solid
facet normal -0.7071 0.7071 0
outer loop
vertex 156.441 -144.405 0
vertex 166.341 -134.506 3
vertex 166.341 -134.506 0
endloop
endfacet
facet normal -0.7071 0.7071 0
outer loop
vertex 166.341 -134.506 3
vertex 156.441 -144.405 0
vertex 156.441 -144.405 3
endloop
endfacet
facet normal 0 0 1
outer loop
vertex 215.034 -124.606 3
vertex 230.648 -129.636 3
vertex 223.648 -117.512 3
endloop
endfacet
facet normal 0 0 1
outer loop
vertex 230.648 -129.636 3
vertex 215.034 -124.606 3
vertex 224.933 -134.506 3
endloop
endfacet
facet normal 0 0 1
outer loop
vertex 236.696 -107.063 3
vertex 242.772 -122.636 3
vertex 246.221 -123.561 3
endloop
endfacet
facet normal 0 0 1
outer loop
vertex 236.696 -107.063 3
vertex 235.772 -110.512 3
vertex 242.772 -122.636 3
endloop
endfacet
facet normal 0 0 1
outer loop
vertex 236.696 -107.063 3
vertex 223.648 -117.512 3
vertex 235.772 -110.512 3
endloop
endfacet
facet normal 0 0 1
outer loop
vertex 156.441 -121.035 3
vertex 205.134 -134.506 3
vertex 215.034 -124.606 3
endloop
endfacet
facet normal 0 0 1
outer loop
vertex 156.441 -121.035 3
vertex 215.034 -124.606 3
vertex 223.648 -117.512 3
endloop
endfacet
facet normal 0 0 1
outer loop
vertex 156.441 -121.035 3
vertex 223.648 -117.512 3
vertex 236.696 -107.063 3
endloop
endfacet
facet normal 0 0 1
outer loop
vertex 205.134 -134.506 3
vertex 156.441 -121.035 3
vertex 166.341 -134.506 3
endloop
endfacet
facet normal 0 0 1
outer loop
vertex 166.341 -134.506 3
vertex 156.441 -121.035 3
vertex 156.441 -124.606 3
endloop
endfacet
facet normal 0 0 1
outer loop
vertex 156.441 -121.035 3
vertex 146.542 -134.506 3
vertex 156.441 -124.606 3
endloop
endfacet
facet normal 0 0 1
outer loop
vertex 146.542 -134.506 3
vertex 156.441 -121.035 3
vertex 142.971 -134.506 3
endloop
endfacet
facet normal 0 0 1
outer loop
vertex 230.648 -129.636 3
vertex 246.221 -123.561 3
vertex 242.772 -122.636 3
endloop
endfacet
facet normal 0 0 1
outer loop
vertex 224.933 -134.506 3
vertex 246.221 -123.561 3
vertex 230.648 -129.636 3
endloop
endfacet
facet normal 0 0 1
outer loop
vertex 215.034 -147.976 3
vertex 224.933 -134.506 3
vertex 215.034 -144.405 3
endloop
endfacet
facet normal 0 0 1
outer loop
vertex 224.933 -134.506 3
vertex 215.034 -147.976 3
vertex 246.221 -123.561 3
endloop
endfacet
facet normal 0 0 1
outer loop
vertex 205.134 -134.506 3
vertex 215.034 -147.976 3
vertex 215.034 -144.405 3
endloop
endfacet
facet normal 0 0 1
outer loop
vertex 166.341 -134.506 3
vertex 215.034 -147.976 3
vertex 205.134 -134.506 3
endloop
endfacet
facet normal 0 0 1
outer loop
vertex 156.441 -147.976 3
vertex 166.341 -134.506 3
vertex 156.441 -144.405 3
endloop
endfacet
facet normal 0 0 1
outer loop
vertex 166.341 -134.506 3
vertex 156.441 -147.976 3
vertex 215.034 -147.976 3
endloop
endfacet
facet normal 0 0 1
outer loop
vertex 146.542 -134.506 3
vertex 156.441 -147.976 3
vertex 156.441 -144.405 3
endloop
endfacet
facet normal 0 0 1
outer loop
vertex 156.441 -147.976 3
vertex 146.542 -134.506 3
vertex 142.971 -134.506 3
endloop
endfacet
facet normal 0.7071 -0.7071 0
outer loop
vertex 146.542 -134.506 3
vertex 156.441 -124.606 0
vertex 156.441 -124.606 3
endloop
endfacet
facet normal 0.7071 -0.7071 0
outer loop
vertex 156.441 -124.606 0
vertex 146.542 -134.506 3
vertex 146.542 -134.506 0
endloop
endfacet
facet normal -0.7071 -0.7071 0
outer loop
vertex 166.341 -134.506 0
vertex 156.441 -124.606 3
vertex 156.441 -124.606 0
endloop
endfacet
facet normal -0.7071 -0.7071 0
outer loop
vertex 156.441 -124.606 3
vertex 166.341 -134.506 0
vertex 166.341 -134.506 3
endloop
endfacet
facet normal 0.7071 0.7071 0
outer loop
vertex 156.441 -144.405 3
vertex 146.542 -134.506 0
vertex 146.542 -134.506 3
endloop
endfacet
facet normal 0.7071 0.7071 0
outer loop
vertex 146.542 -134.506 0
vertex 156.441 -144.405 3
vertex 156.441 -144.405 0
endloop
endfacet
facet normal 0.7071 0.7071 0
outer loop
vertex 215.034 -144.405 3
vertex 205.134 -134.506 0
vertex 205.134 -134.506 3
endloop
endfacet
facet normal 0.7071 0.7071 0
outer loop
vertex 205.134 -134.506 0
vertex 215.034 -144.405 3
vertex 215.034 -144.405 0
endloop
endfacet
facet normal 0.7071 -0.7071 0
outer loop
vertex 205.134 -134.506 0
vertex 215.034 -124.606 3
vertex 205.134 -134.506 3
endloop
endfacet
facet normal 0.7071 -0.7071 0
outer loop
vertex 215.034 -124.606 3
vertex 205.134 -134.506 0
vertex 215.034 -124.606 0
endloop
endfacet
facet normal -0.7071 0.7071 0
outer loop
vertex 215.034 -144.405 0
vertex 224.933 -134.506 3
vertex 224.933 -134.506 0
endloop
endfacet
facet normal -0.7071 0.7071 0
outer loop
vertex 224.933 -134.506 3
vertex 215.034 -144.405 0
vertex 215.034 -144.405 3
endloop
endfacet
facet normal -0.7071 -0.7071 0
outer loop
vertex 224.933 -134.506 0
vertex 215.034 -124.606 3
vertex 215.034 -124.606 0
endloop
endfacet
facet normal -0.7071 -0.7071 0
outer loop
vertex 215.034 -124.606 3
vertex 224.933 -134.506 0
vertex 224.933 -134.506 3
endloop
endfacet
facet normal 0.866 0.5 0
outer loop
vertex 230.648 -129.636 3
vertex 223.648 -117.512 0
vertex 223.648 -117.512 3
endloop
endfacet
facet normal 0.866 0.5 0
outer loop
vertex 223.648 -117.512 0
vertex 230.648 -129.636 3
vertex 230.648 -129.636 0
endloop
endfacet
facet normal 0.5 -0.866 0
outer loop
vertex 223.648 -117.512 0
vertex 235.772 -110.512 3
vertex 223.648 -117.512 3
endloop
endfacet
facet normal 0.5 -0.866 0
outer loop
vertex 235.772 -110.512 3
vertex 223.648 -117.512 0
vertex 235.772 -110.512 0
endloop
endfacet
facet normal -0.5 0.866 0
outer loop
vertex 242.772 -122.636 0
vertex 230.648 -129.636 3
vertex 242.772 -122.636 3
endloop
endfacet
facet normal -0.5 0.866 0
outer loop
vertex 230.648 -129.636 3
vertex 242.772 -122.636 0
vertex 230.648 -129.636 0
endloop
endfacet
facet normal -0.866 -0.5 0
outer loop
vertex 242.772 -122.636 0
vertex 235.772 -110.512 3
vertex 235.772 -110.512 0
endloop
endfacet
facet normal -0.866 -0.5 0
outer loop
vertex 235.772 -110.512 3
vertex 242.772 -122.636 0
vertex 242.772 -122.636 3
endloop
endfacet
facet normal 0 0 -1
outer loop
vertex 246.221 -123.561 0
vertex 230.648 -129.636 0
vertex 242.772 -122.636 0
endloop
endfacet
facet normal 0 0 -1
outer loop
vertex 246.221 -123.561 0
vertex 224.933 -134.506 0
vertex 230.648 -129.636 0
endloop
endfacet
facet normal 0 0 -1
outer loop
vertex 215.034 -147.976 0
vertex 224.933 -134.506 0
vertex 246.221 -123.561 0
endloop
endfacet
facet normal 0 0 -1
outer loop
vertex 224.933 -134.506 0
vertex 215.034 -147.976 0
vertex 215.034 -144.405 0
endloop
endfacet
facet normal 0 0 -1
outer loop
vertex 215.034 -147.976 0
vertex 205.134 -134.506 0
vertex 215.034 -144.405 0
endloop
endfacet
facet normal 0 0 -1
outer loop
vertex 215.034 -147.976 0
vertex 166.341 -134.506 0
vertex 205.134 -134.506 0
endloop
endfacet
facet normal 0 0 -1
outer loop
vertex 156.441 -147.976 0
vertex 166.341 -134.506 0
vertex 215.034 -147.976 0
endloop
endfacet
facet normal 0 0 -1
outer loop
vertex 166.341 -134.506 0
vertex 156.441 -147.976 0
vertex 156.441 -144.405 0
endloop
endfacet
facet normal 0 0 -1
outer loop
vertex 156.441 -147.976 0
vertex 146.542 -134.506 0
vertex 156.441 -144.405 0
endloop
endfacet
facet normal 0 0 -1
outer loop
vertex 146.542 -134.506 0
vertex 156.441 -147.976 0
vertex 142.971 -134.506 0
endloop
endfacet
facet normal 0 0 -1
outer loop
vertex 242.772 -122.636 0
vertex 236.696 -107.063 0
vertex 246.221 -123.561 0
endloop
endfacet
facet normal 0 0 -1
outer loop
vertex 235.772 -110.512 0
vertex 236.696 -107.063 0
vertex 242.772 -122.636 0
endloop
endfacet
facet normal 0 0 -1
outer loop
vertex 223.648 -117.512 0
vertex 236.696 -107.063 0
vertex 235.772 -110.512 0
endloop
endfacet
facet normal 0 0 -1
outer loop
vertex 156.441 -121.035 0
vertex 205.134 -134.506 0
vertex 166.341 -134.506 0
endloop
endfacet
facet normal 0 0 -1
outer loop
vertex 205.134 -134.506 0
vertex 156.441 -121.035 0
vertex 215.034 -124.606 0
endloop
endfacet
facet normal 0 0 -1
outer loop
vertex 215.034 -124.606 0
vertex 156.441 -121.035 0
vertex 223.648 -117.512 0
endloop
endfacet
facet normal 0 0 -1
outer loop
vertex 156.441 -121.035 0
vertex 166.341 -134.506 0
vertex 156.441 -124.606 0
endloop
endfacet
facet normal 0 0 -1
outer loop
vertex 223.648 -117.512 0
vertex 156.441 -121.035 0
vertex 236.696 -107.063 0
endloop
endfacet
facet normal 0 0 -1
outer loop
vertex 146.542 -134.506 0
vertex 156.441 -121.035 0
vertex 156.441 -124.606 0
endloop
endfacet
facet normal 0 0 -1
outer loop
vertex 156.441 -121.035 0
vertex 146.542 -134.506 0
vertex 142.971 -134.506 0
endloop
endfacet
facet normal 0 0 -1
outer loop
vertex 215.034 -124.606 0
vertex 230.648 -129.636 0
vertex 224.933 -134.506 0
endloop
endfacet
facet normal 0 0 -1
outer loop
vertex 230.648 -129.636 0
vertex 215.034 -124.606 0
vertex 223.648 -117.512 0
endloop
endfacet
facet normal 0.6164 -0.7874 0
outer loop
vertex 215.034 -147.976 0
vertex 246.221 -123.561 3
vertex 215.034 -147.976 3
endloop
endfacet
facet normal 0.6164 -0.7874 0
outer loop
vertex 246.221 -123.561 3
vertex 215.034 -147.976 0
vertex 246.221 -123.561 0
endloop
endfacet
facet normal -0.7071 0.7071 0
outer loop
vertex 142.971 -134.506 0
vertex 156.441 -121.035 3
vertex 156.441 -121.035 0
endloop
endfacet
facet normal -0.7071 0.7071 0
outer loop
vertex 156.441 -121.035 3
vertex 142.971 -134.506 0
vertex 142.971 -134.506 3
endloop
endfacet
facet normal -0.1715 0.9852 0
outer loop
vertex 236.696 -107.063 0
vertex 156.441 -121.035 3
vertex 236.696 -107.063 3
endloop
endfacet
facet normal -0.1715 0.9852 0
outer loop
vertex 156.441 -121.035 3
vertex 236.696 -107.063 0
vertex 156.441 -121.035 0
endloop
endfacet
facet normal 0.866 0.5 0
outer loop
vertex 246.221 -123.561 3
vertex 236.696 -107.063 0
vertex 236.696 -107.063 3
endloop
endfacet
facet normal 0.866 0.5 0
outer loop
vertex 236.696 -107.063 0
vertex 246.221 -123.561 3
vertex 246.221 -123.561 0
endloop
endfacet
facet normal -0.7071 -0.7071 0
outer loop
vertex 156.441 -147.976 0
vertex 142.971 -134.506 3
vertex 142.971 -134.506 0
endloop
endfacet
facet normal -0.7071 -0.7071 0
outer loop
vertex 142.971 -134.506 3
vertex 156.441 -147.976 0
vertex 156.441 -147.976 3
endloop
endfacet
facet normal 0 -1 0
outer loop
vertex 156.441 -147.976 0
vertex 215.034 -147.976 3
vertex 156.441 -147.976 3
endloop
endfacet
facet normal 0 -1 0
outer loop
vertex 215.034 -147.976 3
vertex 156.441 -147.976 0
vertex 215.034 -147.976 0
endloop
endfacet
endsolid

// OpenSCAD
$fn = $preview ? 0 : 100;


difference(){
	difference() {
		union() {
			linear_extrude(height = 3) {
				polygon(points = [[215.0338847455189, -147.97596045400934], [156.44111525448116, -147.9759604540093], [142.9707310728774, -134.5055762724056], [156.4411152544811, -121.03519209080189], [236.69625, -107.06283240868598], [246.22125, -123.56061635077954], [215.0338847455189, -147.97596045400934]]);
			}
		}
	}
	/* Holes Below*/
	union(){
		translate(v = [138.0099203653, -121.0267243797, 0]) {
			rotate(a = -30) {
				cube(center = true, size = [14, 14, 6]);
			}
		}
		translate(v = [156.4411152545, -134.5055762724, 0]) {
			rotate(a = -45) {
				cube(center = true, size = [14, 14, 6]);
			}
		}
		translate(v = [215.0338847455, -134.5055762724, 0]) {
			rotate(a = 45) {
				cube(center = true, size = [14, 14, 6]);
			}
		}
		translate(v = [233.2098580290, -120.0742243797, 0]) {
			rotate(a = 30) {
				cube(center = true, size = [14, 14, 6]);
			}
		}
	} /* End Holes */ 
}
